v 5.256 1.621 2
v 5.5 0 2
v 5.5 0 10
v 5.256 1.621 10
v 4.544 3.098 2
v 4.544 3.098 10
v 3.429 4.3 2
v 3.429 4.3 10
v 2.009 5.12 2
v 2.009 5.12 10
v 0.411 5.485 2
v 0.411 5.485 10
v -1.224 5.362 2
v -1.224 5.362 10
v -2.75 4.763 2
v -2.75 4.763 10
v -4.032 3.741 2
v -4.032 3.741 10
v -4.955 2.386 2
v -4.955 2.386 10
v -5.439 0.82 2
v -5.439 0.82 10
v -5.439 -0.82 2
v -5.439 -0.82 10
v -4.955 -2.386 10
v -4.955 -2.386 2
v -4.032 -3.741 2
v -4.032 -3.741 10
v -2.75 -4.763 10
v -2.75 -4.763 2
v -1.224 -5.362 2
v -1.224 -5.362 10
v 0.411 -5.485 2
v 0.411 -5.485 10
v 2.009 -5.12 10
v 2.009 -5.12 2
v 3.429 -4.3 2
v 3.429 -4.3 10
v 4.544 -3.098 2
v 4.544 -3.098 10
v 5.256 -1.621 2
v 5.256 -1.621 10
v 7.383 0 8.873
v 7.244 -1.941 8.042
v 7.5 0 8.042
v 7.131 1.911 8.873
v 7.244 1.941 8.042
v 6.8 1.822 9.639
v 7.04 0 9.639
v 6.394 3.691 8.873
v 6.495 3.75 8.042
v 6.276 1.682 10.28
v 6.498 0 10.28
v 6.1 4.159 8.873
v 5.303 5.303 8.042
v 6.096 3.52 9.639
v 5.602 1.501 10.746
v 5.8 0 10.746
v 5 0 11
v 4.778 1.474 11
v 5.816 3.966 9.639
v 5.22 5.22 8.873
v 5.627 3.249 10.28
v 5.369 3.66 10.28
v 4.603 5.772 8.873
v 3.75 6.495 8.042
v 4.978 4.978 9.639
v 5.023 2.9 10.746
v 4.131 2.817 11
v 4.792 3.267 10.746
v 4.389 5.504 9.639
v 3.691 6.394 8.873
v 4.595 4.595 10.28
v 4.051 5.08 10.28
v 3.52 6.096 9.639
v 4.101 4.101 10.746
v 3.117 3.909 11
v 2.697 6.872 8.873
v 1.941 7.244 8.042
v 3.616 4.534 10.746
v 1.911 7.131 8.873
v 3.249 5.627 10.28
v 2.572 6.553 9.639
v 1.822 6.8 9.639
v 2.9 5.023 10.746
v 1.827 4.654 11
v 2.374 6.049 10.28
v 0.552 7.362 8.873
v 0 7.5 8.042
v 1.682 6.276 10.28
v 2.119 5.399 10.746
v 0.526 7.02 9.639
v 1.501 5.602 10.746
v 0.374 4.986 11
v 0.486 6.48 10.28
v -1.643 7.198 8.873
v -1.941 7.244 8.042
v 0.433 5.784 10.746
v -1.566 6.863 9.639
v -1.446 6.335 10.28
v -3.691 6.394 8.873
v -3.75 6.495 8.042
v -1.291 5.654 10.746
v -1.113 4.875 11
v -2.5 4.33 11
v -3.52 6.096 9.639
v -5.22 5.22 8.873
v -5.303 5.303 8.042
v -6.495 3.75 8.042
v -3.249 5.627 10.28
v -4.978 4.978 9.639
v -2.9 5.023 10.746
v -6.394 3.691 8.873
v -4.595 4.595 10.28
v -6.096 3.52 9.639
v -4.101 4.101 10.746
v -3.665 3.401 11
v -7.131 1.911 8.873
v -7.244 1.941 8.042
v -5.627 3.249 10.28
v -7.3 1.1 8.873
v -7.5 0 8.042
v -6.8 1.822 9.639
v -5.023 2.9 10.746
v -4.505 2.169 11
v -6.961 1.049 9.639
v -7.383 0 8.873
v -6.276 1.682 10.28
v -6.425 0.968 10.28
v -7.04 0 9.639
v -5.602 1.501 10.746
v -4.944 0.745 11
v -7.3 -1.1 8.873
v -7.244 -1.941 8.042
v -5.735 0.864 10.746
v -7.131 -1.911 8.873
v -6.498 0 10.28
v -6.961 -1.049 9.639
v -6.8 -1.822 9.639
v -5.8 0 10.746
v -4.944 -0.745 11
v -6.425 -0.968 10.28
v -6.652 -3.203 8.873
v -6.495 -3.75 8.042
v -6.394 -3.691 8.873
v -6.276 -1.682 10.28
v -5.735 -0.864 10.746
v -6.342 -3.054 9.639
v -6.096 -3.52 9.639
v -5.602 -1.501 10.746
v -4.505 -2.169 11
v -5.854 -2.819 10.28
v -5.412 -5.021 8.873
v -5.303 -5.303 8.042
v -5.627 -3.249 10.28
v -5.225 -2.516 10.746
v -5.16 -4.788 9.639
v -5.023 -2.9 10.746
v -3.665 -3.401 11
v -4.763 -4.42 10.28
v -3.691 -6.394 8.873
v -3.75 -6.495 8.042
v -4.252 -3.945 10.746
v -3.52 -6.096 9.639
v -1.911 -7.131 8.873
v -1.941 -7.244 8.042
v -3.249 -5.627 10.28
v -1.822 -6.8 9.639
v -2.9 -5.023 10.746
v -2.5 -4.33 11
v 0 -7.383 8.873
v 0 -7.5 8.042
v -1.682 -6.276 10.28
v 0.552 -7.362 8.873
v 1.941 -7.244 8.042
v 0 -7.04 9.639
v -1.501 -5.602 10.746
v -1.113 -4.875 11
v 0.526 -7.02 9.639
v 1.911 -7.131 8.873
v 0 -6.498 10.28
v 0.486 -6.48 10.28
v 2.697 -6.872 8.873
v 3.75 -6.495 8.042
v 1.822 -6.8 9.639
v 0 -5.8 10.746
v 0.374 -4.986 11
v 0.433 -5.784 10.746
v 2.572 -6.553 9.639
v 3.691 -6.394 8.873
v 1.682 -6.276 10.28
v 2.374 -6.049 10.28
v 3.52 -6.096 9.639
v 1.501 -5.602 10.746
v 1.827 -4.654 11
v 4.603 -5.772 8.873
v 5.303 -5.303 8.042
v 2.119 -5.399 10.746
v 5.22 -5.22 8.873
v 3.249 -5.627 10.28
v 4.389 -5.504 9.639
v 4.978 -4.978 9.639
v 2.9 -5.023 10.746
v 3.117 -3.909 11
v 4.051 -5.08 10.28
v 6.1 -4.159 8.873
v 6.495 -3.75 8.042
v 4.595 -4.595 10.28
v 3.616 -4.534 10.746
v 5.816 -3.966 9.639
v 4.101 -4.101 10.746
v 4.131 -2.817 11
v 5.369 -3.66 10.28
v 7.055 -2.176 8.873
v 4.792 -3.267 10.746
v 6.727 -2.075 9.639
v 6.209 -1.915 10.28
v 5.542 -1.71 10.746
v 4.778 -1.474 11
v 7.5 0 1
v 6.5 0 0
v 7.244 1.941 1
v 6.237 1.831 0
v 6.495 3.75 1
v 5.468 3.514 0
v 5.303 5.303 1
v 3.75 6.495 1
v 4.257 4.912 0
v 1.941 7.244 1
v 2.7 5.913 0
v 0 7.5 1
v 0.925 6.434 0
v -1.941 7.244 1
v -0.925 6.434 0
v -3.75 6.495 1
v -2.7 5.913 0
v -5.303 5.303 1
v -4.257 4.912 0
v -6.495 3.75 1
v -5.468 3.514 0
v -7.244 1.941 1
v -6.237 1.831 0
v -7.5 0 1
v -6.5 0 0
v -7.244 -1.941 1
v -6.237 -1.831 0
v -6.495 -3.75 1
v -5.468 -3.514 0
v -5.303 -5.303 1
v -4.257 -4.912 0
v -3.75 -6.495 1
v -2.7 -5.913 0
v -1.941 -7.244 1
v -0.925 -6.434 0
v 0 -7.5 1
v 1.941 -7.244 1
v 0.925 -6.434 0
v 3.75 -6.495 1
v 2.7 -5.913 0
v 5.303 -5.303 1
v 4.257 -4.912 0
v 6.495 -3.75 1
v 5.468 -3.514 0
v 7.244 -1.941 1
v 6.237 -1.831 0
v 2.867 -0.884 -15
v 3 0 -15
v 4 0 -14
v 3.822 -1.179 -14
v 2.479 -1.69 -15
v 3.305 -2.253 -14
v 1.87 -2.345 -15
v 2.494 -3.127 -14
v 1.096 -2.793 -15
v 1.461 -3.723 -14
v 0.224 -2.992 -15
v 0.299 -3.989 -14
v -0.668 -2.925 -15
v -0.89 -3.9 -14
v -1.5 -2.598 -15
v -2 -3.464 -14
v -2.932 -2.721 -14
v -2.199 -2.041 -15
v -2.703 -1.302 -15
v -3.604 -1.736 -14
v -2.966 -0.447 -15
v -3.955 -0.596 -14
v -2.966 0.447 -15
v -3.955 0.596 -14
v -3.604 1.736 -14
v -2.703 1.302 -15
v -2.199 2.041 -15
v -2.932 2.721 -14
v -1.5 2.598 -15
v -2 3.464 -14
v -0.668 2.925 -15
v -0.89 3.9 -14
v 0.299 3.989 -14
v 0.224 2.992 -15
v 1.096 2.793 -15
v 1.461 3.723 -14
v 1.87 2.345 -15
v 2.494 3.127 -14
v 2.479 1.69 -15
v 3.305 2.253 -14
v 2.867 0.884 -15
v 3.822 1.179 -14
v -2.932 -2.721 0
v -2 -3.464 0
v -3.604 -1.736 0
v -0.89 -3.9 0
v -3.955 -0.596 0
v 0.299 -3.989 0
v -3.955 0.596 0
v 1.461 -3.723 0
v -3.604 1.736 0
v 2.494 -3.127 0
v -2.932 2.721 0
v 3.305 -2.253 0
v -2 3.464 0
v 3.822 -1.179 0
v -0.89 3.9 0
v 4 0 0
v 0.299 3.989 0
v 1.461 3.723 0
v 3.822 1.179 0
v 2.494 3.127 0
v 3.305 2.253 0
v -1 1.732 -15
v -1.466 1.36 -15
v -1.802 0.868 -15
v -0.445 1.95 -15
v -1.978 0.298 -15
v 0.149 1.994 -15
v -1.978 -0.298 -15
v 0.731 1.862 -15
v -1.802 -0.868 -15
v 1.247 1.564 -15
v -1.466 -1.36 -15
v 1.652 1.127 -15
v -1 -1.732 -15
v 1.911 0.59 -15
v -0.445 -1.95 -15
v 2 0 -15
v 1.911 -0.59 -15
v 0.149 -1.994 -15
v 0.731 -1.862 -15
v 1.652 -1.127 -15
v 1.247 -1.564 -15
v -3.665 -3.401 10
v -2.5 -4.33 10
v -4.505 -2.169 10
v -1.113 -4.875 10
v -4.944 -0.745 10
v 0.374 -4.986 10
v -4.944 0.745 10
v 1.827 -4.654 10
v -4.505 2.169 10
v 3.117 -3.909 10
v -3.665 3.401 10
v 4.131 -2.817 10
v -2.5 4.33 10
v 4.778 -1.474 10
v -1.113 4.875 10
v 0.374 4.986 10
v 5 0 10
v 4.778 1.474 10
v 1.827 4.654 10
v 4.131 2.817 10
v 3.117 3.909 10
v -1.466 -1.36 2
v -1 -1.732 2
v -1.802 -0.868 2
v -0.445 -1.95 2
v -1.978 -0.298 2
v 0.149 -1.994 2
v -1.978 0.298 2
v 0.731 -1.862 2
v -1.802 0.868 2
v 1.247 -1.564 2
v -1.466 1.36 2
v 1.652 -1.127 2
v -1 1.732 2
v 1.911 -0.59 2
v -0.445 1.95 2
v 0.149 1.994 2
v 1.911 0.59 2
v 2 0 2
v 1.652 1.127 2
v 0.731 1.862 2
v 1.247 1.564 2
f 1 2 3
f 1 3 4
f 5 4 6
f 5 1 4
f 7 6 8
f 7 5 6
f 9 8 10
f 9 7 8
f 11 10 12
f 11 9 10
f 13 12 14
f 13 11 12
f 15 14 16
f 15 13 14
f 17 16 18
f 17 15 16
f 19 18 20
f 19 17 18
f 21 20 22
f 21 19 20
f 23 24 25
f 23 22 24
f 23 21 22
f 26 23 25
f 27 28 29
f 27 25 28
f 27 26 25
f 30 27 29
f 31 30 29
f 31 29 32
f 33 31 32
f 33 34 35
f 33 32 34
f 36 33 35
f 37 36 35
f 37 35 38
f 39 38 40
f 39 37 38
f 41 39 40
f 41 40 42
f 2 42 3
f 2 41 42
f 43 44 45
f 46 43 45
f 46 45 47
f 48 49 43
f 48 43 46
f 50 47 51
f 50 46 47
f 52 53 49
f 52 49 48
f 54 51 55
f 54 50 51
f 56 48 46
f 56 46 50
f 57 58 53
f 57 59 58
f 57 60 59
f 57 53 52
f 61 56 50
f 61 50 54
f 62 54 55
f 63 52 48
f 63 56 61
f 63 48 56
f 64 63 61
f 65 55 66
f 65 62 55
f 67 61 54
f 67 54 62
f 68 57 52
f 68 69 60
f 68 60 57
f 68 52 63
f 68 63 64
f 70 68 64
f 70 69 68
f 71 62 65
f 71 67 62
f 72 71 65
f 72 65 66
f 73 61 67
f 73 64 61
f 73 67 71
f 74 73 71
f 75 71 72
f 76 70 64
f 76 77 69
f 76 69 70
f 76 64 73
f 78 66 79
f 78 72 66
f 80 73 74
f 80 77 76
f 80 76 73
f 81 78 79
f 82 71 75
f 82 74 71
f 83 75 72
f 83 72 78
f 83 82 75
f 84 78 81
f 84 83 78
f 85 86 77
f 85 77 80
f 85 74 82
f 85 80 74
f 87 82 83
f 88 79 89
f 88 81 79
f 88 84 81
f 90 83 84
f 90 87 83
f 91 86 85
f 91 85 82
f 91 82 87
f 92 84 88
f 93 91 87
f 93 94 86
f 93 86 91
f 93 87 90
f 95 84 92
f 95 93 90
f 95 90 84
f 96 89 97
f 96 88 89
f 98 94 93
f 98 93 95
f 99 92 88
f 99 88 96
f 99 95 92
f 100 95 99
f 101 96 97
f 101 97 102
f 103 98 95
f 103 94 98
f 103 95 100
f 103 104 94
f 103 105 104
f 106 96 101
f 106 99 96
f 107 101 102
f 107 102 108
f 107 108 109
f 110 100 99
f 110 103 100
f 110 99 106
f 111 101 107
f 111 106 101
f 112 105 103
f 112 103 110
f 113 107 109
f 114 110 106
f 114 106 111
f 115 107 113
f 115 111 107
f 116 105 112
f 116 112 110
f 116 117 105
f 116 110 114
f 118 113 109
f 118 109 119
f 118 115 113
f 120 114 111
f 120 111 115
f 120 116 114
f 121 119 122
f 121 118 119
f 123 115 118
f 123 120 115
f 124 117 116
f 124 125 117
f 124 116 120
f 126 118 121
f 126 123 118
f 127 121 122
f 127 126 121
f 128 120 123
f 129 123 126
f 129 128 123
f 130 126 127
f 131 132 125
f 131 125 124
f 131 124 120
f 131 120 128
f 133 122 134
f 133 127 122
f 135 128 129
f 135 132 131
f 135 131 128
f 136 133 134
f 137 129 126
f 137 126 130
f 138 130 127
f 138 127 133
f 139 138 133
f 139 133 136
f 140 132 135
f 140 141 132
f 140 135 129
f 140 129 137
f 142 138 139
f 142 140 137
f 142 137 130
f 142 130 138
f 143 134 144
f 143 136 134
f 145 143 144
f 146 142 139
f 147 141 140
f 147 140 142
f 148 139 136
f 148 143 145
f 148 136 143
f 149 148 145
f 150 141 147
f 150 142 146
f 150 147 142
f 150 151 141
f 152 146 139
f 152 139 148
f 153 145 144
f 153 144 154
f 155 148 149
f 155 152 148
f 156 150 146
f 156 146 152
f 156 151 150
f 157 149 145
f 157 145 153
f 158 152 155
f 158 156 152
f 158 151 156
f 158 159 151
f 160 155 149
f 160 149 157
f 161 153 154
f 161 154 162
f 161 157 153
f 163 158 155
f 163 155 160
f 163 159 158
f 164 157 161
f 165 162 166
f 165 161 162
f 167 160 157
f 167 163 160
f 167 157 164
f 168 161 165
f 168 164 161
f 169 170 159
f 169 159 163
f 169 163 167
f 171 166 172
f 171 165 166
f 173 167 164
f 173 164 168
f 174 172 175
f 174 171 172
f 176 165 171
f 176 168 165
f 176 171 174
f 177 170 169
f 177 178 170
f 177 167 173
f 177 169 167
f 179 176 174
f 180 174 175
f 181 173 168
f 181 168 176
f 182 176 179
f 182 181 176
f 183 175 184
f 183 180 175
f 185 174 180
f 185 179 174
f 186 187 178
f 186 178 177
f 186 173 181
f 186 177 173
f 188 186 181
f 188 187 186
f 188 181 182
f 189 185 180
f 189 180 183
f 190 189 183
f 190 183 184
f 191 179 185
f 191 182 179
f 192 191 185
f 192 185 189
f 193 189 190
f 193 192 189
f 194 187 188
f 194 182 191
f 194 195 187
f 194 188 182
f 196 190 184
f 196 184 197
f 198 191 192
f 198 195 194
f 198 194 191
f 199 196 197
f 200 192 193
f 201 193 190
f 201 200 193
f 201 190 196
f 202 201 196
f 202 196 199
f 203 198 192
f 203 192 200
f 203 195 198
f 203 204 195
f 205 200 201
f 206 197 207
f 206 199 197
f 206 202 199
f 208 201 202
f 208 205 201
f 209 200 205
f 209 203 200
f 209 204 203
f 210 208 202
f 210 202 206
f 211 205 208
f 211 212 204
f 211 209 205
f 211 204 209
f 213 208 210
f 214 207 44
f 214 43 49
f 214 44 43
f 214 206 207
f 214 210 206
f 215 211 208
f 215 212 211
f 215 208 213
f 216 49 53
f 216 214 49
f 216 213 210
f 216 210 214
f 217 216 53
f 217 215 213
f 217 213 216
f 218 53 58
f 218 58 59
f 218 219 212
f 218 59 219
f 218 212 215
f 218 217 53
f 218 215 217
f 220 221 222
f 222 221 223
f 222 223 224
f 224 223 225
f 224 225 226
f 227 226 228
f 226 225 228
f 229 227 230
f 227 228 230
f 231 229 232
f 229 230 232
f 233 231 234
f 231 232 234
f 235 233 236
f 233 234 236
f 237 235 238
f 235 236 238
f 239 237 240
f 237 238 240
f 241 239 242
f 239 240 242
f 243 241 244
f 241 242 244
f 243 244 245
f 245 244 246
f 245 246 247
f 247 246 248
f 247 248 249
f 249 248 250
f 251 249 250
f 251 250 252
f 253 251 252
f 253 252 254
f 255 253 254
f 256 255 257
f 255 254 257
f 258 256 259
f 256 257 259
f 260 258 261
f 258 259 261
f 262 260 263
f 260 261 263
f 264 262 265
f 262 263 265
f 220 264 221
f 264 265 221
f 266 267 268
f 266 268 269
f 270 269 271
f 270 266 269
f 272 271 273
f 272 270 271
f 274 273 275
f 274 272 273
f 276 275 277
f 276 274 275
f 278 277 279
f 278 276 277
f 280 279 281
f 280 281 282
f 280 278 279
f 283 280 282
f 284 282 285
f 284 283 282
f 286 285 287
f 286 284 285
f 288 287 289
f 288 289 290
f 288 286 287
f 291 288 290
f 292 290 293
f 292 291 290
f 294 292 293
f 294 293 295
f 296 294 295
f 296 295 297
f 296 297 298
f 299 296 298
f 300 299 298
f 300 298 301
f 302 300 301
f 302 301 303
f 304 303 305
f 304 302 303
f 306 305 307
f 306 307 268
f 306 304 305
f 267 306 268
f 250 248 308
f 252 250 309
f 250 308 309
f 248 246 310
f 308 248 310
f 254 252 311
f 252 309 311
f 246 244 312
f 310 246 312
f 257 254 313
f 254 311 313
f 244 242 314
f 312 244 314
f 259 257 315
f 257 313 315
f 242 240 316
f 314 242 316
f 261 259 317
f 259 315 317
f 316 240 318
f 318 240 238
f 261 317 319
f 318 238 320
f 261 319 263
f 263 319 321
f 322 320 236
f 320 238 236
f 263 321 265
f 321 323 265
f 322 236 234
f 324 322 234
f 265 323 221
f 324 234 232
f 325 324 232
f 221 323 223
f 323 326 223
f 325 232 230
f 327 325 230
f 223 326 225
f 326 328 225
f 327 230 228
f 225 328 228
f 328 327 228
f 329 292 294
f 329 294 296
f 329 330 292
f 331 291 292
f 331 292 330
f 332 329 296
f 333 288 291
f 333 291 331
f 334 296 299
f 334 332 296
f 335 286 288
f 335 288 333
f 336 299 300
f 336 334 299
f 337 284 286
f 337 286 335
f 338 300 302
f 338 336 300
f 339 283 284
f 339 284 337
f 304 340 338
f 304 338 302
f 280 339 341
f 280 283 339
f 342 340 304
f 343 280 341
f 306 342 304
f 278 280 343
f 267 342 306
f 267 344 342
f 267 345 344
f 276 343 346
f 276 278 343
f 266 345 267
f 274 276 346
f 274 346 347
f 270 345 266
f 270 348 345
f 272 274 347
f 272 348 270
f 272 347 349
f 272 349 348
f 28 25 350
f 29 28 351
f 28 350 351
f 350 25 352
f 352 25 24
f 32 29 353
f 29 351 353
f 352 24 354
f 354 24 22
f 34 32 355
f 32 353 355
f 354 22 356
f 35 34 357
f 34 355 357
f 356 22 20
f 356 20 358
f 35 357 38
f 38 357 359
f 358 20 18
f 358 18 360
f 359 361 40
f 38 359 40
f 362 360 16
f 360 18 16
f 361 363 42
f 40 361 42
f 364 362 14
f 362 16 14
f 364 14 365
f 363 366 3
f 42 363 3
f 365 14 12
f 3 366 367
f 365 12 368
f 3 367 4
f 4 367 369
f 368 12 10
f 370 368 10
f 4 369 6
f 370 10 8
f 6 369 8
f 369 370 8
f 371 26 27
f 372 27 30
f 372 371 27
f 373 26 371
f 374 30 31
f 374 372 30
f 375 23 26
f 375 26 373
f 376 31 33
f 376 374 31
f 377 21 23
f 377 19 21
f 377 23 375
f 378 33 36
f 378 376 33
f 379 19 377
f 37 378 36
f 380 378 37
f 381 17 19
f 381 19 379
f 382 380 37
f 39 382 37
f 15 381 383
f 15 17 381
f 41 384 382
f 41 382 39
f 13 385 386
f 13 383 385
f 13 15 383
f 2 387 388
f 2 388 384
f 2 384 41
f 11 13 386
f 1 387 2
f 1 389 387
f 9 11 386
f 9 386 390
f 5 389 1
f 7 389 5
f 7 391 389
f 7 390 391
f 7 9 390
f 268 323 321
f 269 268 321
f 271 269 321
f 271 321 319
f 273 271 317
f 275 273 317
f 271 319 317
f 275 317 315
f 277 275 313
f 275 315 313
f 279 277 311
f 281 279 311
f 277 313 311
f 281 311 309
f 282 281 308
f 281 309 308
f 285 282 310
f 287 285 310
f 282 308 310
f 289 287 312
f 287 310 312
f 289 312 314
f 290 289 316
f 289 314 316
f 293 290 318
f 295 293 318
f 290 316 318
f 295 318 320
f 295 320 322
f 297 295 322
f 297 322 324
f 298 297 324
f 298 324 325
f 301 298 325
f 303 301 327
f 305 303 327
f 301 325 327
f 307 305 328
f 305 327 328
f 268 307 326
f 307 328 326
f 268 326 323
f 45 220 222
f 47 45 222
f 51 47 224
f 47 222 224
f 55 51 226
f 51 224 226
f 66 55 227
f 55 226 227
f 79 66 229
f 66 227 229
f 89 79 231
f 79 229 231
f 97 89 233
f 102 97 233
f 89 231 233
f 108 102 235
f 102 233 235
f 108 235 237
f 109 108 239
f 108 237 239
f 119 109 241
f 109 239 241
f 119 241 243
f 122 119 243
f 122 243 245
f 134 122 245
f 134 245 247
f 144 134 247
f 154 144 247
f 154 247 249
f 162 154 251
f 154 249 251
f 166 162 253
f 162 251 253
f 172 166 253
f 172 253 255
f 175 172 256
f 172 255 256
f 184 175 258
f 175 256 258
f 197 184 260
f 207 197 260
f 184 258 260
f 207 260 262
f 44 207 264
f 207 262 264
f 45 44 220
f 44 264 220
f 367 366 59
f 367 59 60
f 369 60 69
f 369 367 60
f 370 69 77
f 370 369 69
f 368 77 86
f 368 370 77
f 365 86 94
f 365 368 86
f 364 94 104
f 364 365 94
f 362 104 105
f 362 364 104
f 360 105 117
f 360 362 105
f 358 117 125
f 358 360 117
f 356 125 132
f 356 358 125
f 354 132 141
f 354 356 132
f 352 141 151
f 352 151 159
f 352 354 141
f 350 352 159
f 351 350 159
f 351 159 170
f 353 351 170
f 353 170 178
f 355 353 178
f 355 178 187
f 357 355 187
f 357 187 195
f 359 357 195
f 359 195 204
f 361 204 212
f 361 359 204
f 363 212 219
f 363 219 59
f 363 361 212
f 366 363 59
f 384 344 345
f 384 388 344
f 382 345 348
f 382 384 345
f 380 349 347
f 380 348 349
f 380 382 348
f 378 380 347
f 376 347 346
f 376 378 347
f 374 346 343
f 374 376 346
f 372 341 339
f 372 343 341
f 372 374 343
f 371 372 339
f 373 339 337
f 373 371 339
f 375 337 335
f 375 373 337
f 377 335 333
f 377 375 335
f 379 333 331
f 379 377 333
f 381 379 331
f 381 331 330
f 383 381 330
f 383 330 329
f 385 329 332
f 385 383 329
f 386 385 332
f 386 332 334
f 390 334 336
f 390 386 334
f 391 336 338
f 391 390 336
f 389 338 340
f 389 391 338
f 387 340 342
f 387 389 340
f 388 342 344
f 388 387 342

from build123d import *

# Parameters (mm, degrees)
F0_R     = 7.5
F1_DEPTH = 10
F2_R     = 4
F3_DEPTH = 15
F4_T     = -2
F5_R     = 7.5
F5_R_2   = 5
F6_DEPTH = 1
F8_SIZE  = 1
F9_SIZE  = 1


# Not quite as in the source:
# - a fillet or chamfer that OpenCascade refuses, or shapes differently, is made with other operations: its cross-section is extruded or revolved along the edge and cut away or added


with BuildPart() as f1:
    # F0 (on Top) → F1 (new body)
    with BuildSketch(Plane.XY):
        Circle(F0_R)
    extrude(amount=F1_DEPTH)

    # F2 (on face) → F3 (join)
    with BuildSketch(Plane(origin=(0, 0, 0), x_dir=(1, 0, 0), z_dir=(0, 0, -1))):
        Circle(F2_R)
    extrude(amount=F3_DEPTH)

    # F4
    f4_openings = [f1.faces().sort_by_distance(p)[0] for p in [
        (0, 0, 10),
        (0, 0, -15),
    ]]
    offset(amount=F4_T, openings=f4_openings, kind=Kind.INTERSECTION)

    # F5 (on face) → F6 (join)
    with BuildSketch(Plane.XY.offset(10)):
        Circle(F5_R)
        Circle(F5_R_2, mode=Mode.SUBTRACT)
    extrude(amount=F6_DEPTH)

    # F7: fillet of radius 3 on 1 edges, made by hand

    # F7_s1 → F7_t2 (revolve, cut)
    with BuildSketch(Plane.XZ):
        with BuildLine():
            ThreePointArc((7.5, 8.0419601084), (6.7912878475, 9.9784517816), (5, 11))
            Line((5, 11), (7.5, 11))
            Line((7.5, 11), (7.5, 8.0419601084))
        make_face()
    revolve(axis=Axis((0, 0, 11), (0, 0, 1)), mode=Mode.SUBTRACT)

    # F8
    f8_edges = [f1.edges().sort_by_distance(p)[0] for p in [
        (-7.5, 0, 0),
    ]]
    chamfer(f8_edges, length=F8_SIZE)

    # F9
    f9_edges = [f1.edges().sort_by_distance(p)[0] for p in [
        (-4, 0, -15),
    ]]
    chamfer(f9_edges, length=F9_SIZE)


solid = f1.part
